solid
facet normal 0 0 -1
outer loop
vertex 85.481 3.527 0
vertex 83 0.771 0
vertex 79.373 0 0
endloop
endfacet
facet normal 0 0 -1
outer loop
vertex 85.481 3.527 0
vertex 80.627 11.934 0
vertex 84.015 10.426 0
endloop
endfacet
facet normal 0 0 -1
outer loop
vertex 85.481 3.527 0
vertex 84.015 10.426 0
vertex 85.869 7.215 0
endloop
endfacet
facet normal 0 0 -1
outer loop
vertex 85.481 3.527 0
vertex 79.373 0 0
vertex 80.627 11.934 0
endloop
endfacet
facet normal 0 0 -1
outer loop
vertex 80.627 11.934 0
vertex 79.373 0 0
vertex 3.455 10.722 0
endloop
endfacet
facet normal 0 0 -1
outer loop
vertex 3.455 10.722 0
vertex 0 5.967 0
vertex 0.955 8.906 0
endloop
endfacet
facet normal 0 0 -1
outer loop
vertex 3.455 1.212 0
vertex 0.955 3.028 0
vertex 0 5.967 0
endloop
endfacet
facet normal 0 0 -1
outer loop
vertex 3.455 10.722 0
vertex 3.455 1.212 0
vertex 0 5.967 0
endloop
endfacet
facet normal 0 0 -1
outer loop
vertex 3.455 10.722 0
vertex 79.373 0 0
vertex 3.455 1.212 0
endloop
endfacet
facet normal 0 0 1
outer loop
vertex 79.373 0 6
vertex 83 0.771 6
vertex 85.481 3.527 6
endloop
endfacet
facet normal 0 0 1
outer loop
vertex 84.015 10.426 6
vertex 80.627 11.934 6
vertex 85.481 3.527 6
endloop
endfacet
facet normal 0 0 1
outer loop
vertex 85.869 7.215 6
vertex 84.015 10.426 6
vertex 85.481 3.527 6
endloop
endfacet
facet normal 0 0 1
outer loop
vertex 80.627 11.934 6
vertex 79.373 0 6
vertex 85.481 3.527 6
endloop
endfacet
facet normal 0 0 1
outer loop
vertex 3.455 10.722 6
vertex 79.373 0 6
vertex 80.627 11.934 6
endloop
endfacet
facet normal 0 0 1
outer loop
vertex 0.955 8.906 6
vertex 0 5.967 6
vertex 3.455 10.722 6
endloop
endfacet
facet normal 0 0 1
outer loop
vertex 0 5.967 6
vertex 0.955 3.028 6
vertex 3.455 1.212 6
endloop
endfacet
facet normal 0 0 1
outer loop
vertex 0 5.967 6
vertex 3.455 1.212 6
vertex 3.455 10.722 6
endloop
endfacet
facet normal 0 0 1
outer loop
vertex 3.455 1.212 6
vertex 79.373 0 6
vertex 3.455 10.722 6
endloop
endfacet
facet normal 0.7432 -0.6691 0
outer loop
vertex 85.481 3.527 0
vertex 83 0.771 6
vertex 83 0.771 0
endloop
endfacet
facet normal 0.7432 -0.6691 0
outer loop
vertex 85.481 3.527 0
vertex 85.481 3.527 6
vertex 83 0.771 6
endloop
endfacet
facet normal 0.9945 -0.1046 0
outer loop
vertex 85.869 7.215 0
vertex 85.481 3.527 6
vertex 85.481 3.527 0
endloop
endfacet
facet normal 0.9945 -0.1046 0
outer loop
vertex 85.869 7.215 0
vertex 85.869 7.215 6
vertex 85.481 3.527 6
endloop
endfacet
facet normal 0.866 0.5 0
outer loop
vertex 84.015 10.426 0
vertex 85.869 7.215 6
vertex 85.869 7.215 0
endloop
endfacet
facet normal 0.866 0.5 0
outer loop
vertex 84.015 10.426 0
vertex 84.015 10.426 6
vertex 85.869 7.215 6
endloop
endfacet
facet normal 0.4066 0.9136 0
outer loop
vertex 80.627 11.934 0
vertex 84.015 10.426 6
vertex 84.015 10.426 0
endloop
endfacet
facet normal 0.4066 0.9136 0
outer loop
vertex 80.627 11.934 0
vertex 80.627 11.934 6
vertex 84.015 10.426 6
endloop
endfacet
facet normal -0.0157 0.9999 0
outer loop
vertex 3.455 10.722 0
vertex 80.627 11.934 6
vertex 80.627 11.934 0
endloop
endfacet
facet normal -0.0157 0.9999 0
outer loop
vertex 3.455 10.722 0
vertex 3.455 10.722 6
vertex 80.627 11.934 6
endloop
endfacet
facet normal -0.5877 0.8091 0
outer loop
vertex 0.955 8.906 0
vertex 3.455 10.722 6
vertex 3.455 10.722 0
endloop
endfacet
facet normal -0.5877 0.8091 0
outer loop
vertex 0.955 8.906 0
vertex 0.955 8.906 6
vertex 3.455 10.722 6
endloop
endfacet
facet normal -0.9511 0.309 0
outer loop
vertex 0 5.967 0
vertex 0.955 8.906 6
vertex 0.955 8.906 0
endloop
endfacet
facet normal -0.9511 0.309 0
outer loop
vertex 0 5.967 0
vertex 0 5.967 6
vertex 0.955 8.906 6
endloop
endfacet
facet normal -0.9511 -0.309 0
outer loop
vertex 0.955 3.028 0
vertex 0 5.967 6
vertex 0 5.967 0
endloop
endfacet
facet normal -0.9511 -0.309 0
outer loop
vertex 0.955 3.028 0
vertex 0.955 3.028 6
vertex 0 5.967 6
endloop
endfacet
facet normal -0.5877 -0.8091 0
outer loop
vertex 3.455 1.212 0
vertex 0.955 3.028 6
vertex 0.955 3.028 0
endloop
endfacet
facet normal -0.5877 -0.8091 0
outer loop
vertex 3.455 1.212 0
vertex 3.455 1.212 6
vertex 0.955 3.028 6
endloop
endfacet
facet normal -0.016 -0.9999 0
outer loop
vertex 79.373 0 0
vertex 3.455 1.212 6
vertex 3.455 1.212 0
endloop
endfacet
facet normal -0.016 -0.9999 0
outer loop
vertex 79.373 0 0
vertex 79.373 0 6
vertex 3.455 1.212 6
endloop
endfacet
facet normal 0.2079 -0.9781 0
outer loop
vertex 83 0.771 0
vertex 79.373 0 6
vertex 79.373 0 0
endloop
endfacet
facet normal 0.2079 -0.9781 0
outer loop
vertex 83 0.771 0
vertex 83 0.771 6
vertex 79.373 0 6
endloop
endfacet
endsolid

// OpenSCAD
$fn = 32;

// ----------------------------------------------------------------------
// Lever arm: two bosses 10 and 12 mm, 75 mm between centres
// ----------------------------------------------------------------------

// --- parameters (mm) ---
profile_height = 6;       // extrusion height
profile_points = 11;      // points of the closed outline

profile = [[0, 5.967], [0.955, 3.028], [3.455, 1.212], [79.373, 0], [83, 0.771], [85.481, 3.527], [85.869, 7.215], [84.015, 10.426], [80.627, 11.934], [3.455, 10.722], [0.955, 8.906]];  // single closed polygon, 11 points, counter clockwise

// --- the one profile operation ---
linear_extrude(height = profile_height) polygon(points = profile);
